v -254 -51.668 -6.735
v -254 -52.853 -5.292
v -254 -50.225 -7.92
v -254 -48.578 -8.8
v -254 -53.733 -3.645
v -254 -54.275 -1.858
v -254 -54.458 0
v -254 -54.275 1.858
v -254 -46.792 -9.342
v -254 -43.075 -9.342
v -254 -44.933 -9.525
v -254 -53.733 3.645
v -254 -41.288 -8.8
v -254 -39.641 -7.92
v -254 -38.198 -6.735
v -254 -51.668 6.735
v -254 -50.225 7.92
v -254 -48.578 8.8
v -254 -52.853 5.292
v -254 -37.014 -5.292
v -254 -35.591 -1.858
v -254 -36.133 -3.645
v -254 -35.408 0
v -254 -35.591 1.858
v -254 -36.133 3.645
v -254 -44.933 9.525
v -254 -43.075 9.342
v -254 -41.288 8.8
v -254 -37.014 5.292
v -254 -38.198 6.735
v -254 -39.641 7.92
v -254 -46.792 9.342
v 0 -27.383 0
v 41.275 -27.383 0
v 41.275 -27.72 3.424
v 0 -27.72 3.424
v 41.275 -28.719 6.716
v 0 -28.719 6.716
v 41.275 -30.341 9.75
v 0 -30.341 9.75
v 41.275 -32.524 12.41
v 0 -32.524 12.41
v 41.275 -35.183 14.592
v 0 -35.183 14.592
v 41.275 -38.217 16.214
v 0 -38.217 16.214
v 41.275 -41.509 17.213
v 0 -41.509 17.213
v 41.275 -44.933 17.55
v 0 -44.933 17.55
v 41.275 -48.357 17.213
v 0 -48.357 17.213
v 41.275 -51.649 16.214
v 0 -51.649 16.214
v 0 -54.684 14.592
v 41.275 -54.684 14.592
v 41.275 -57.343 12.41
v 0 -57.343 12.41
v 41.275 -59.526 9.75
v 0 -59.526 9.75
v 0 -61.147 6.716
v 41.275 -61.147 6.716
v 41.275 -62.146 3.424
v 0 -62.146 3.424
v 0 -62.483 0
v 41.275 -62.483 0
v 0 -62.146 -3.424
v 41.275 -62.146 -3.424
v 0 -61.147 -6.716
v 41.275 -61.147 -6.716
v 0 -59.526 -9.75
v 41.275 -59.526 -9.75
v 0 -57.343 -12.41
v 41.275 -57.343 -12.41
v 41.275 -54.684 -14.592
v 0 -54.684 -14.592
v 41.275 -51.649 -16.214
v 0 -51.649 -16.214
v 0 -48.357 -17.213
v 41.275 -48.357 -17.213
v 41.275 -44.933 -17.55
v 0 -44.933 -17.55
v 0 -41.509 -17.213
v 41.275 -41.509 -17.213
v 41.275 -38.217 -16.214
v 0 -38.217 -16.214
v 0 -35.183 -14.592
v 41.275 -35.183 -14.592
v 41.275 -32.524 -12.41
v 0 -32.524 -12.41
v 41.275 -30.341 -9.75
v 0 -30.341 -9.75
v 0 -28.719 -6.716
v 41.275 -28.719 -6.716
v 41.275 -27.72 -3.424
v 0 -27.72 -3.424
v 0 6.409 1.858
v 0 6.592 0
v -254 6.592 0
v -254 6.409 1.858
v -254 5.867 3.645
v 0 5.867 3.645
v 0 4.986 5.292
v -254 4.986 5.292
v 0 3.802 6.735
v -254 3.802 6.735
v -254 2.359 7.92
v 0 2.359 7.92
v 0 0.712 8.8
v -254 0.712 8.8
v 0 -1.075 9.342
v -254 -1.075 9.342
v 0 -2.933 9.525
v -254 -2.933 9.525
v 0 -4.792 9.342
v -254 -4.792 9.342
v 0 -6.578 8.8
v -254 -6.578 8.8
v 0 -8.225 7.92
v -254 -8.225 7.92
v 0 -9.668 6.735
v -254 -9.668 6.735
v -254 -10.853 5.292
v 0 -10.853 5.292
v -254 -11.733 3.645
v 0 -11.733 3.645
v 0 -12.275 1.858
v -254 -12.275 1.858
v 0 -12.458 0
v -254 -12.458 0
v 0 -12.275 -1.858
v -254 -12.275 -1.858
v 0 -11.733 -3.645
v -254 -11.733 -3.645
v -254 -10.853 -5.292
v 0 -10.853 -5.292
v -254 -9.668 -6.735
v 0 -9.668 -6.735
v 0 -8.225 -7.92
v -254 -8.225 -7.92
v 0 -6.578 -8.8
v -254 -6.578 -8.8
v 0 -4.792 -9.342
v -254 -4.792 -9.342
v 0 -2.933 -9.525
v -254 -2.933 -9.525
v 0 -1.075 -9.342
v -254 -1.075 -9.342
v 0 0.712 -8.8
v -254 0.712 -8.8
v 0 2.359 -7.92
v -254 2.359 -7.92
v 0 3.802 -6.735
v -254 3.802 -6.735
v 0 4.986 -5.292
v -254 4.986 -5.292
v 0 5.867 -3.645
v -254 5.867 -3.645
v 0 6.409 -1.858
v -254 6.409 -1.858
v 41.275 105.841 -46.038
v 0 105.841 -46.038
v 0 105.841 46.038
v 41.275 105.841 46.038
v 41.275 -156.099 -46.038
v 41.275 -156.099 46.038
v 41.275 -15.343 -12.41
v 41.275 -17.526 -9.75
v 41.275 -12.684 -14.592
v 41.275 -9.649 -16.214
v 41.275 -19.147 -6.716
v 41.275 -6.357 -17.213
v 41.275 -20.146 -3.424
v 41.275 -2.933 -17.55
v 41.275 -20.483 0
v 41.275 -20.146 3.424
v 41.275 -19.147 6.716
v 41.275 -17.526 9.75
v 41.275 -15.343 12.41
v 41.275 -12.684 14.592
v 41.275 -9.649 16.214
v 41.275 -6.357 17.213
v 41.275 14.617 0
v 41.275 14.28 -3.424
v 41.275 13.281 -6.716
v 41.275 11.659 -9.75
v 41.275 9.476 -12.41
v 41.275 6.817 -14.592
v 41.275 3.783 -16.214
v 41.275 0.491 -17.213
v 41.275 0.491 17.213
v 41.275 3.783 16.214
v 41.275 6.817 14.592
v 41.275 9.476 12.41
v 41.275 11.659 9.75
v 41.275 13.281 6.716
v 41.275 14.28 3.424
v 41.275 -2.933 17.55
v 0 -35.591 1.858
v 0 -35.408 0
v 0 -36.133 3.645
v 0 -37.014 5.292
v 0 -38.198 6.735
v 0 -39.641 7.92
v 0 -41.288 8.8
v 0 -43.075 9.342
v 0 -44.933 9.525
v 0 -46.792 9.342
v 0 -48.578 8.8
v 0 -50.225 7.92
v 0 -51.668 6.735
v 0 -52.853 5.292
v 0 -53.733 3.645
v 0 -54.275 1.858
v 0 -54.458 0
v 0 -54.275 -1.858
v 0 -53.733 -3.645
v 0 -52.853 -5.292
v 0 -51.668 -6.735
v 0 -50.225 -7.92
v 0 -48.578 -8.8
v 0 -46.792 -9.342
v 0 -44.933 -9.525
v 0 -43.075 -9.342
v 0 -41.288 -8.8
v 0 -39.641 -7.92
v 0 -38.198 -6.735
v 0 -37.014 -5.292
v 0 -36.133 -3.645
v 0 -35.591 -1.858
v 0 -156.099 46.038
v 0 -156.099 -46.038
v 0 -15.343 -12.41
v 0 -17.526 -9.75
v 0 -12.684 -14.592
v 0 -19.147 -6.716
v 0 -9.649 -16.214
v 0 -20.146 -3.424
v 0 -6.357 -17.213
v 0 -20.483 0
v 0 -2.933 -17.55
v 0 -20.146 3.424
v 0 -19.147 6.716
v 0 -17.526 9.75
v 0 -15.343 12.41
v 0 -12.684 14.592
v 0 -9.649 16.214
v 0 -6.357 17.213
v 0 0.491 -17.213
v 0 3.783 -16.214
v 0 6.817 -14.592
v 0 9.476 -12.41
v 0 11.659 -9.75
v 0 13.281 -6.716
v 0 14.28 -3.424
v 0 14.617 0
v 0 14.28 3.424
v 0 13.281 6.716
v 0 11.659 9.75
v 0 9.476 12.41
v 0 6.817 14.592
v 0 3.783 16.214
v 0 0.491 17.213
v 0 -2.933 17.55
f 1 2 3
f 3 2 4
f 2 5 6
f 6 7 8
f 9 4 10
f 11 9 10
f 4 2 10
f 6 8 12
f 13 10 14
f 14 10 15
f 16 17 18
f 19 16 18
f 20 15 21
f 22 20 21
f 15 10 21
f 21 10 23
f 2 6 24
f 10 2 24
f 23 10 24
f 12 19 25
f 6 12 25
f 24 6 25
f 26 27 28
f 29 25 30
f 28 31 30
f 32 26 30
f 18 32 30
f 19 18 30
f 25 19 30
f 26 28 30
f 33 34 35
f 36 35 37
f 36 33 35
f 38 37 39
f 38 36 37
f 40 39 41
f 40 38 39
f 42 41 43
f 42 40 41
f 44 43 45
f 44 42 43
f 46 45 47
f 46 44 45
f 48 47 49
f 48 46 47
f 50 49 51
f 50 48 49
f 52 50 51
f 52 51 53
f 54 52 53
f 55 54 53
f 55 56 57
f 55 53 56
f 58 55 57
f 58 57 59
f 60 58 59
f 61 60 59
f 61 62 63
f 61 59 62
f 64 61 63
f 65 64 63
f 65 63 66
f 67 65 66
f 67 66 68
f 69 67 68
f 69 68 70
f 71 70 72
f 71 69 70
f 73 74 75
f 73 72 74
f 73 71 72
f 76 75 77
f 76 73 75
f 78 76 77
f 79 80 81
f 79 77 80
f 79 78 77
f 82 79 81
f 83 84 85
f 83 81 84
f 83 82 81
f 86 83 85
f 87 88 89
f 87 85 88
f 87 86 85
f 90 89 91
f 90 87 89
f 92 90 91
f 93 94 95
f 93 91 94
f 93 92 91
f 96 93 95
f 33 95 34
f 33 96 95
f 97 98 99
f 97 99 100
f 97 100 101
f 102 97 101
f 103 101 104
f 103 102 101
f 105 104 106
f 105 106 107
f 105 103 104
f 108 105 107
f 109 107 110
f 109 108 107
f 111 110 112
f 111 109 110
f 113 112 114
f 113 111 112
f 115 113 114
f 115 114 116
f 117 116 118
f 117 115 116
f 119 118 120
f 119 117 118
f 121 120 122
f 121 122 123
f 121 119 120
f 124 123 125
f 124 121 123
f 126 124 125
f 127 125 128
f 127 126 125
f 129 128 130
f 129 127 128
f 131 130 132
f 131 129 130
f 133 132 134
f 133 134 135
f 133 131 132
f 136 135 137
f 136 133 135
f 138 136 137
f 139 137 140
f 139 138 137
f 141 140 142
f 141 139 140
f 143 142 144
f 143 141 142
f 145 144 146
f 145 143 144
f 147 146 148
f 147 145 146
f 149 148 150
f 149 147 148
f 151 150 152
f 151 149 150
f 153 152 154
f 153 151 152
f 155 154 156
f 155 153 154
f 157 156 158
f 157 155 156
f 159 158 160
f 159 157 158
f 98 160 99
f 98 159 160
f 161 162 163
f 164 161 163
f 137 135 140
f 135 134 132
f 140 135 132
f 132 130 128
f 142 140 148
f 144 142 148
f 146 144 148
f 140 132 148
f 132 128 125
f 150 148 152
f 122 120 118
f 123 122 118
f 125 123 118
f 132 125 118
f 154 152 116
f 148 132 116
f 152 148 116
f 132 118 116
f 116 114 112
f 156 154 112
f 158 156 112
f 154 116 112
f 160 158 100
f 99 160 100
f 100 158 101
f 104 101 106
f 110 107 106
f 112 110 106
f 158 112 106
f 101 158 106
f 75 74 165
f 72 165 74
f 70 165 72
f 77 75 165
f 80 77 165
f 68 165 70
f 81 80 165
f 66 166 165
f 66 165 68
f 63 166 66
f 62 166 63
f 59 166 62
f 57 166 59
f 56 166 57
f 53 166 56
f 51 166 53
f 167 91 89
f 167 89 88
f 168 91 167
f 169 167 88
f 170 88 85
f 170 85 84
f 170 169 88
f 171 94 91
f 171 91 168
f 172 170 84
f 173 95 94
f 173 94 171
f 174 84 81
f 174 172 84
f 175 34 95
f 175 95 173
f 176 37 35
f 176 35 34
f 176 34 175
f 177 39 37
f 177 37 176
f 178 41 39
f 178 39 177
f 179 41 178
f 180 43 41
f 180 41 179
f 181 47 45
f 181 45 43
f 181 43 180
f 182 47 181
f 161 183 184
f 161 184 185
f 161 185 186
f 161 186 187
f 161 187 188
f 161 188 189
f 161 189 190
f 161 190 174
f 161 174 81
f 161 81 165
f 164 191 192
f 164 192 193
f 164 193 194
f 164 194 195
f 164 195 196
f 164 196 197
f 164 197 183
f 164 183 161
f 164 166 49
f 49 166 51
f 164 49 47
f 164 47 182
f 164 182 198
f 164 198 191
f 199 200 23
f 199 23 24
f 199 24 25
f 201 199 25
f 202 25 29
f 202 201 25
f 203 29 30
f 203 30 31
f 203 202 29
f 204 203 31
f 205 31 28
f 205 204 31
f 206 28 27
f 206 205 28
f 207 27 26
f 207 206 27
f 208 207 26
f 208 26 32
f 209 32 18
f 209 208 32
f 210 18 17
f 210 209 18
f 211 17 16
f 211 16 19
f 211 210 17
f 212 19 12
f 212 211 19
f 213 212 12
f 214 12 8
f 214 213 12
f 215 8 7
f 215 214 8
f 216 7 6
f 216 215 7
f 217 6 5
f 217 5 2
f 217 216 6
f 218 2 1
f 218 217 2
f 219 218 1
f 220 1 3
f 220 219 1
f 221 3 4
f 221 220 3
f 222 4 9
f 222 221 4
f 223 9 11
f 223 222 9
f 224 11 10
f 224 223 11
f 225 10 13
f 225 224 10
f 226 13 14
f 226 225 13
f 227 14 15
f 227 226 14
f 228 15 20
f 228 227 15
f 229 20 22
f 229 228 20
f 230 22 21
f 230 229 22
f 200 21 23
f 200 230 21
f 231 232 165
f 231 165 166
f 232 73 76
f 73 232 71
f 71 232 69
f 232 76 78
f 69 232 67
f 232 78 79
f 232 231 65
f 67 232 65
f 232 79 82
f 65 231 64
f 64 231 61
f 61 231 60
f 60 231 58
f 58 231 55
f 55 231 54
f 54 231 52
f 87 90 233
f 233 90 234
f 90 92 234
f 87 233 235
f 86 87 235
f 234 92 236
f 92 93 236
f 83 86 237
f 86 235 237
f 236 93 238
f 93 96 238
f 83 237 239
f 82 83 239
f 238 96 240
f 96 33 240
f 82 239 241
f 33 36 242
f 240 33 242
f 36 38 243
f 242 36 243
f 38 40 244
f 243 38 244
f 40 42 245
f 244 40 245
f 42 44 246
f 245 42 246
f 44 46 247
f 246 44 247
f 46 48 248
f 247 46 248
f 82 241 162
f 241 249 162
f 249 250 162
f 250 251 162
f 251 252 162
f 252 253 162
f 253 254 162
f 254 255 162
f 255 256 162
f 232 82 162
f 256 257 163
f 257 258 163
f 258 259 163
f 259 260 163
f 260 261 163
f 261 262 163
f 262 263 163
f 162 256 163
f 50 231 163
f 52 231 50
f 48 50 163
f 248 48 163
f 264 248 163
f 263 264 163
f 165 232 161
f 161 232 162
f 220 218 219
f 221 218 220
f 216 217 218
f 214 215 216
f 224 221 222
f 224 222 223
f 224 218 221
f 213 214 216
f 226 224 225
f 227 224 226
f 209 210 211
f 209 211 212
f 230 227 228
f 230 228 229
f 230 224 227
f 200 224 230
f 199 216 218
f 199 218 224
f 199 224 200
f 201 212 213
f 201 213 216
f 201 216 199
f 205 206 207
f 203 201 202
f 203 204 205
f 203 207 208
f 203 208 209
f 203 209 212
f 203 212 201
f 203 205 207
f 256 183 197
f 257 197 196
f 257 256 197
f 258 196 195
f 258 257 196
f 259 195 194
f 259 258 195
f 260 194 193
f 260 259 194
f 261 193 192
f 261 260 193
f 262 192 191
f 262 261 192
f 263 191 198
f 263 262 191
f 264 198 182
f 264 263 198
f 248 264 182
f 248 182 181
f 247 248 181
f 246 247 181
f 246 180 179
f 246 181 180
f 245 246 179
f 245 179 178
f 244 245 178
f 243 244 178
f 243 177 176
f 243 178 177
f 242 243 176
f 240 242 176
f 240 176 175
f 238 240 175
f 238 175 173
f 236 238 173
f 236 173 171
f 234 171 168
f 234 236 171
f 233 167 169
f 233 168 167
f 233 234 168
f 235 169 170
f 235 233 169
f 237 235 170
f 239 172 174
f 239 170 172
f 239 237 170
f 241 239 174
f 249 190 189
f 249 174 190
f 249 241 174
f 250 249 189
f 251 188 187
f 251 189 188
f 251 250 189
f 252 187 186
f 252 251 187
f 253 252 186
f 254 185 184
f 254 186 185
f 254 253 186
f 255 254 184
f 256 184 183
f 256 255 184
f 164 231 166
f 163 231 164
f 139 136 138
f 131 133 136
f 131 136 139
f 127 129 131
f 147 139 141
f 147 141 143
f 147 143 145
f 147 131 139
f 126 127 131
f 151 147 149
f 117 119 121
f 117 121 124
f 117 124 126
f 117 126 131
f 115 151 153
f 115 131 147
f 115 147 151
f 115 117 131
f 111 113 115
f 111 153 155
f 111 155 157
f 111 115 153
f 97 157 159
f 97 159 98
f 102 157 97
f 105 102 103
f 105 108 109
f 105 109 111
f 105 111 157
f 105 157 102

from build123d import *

# Parameters (mm, degrees)
F0_R     = 9.525
F1_DEPTH = 254
F3_W     = 261.94
F3_H     = 92.075
F4_DEPTH = 41.275
F2_R     = 17.55
F5_DEPTH = 65.2


with BuildPart() as f1:
    # F0 (on Right) → F1 (new body)
    with BuildSketch(Plane.YZ):
        with Locations((-44.933274, 0)):
            Circle(F0_R)
        with Locations((-2.933274, 0)):
            Circle(F0_R)
    extrude(amount=-F1_DEPTH)


with BuildPart() as f4:
    # F3 (on Right) → F4 (new body)
    with BuildSketch(Plane.YZ):
        with Locations((-25.129005, 0)):
            Rectangle(F3_W, F3_H)
    extrude(amount=F4_DEPTH)

    # F2 (on Right) → F5 (cut)
    with BuildSketch(Plane.YZ):
        with Locations((-44.933274, 0)):
            Circle(F2_R)
        with Locations((-2.933274, 0)):
            Circle(F2_R)
    extrude(amount=F5_DEPTH, mode=Mode.SUBTRACT)


solid = Compound([f1.part, f4.part])
